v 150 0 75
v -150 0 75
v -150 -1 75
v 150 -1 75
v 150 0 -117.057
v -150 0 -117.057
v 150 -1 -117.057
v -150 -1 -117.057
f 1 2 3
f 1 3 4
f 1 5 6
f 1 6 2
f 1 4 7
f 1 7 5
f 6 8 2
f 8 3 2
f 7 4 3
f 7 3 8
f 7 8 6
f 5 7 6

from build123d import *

# Parameters (mm, degrees)
SKETCH3_W          = 300
SKETCH3_H          = 150
BASE_FLANGE1_DEPTH = 1
EDGE_FLANGE2_DEPTH = 300
UNFOLD1_START      = -150
UNFOLD1_DEPTH      = 300
UNFOLD1_2_DEPTH    = 300


# Read off the part's stored shape, not the designer's step: Unfold1
# Sheet-metal steps are written as plain solids
with BuildPart() as part:
    # Sketch3 → Base-Flange1 (new body)
    with BuildSketch(Plane(origin=(0, 0, 0), x_dir=(1, 0, 0), z_dir=(0, 1, 0))):
        Rectangle(SKETCH3_W, SKETCH3_H)
    extrude(amount=-BASE_FLANGE1_DEPTH)

    # Edge-Flange2 section (across the edge) → Edge-Flange2 (add)
    with BuildSketch(Plane(origin=(150, 0, -647.943250647), x_dir=(0, -0.9998476951563913, 0.017452406437283758), z_dir=(-1, 0, 0))):
        with BuildLine():
            Line((-1, 572.943250647), (-1, 598.411349871))
            Line((-1, 598.411349871), (0, 598.411349871))
            Line((0, 598.411349871), (0, 572.943250647))
            ThreePointArc((0, 572.943250647), (4.956367323, 567.943441031), (9.999238476, 572.855988614))
            Line((9.999238476, 572.855988614), (10.999086171, 572.838536208))
            ThreePointArc((10.999086171, 572.838536208), (4.947640787, 566.943479108), (-1, 572.943250647))
        make_face()
    extrude(amount=EDGE_FLANGE2_DEPTH)

    # Unfold1 outline → Unfold1 (cut)
    with BuildSketch(Plane.YZ.offset(UNFOLD1_START)):
        with BuildLine():
            Line((0, -75), (0, -78.31662479))
            ThreePointArc((0, -78.31662479), (6.681854726, -80.759458714), (10.999086171, -75.104714439))
            Line((10.999086171, -75.104714439), (11.44356579, -49.640494129))
            Line((11.44356579, -49.640494129), (10.443718095, -49.623041723))
            Line((10.443718095, -49.623041723), (9.999238476, -75.087262032))
            ThreePointArc((9.999238476, -75.087262032), (4.956367323, -79.999809615), (0, -75))
        make_face()
    extrude(amount=UNFOLD1_DEPTH, mode=Mode.SUBTRACT)

    # Unfold1 2 outline → Unfold1 2 (add)
    with BuildSketch(Plane.YZ.offset(UNFOLD1_START)):
        with BuildLine():
            Line((-1, -75), (-1, -117.057279231))
            Line((-1, -117.057279231), (0, -117.057279231))
            Line((0, -117.057279231), (0, -78.31662479))
            ThreePointArc((0, -78.31662479), (-0.744562646, -76.732050807), (-1, -75))
        make_face()
    extrude(amount=UNFOLD1_2_DEPTH)


solid = part.part
